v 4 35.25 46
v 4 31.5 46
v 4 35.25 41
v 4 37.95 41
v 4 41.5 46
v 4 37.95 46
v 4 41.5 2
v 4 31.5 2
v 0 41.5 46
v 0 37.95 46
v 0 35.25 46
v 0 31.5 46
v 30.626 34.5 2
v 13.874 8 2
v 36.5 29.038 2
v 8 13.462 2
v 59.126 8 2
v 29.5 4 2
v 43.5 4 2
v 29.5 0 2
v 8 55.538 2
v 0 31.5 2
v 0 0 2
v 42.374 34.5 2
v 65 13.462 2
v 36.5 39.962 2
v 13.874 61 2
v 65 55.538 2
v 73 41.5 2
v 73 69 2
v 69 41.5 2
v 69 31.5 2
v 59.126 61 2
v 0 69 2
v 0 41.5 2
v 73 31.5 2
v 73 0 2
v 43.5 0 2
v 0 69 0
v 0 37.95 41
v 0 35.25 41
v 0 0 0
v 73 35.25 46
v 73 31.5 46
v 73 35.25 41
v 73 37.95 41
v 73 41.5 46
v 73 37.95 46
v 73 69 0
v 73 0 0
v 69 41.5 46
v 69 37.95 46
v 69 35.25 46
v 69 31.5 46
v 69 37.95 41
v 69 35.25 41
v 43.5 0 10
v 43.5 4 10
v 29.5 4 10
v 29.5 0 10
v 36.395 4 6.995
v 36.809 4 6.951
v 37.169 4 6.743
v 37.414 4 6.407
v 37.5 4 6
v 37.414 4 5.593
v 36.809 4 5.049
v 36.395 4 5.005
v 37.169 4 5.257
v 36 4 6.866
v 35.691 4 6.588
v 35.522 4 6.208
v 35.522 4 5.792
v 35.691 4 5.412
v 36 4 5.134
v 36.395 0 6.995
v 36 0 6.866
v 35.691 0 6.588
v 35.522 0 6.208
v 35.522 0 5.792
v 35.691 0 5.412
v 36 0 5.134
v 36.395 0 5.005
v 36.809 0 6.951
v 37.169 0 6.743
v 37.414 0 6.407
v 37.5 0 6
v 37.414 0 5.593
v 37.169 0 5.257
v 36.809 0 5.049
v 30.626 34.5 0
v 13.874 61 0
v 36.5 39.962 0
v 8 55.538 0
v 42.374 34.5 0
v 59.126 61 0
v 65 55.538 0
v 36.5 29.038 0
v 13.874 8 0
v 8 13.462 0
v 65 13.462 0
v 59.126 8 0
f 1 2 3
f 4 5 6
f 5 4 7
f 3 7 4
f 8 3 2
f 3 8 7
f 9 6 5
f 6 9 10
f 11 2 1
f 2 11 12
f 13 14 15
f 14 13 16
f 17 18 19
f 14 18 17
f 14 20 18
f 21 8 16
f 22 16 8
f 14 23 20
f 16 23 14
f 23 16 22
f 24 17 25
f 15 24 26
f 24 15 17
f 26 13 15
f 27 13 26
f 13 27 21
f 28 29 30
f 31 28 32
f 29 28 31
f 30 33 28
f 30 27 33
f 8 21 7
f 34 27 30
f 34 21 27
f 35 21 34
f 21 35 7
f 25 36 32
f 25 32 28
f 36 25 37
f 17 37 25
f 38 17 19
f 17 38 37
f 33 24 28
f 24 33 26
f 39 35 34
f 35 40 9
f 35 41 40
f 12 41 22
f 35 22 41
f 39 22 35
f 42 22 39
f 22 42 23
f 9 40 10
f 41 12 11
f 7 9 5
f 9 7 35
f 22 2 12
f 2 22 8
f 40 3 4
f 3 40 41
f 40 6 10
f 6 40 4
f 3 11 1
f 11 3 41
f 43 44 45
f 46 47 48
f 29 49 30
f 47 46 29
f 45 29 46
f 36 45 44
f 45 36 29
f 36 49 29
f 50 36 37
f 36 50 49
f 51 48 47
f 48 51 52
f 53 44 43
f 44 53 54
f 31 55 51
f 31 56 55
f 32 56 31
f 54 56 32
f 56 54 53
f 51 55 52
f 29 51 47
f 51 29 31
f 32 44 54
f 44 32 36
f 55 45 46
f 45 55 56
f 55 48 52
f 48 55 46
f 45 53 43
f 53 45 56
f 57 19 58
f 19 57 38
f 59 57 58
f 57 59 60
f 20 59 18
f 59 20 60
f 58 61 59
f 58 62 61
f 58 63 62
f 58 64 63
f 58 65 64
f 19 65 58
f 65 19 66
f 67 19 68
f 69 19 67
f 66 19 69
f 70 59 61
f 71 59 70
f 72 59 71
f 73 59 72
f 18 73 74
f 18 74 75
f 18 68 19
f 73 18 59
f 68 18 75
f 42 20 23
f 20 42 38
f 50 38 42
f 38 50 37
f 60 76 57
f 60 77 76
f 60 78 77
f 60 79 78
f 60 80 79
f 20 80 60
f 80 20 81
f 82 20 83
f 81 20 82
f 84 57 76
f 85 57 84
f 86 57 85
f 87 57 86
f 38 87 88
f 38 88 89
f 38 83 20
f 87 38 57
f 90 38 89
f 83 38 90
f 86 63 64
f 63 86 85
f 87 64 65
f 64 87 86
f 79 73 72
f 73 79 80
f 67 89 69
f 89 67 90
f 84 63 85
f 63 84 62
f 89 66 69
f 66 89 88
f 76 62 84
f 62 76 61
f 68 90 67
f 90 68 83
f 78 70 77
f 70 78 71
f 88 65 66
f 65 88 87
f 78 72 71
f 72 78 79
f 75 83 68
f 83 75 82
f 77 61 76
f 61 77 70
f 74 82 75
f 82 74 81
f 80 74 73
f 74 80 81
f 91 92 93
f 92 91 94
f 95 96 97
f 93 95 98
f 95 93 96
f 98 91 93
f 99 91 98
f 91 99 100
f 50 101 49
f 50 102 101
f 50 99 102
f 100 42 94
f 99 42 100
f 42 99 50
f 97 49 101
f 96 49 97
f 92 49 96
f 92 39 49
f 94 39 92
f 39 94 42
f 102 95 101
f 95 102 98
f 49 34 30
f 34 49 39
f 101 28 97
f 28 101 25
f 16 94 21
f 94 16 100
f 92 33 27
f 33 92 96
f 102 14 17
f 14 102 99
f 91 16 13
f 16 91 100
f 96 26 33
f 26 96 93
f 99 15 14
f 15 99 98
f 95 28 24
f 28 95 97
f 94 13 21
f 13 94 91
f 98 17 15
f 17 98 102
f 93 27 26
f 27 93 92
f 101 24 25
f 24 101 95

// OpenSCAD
/*
 * Created by:
 * Thomas Buck <xythobuz@xythobuz.de> in April 2016
 *
 * Licensed under the Creative Commons - Attribution license.
 */

// -----------------------------------------------------------

spoolWidth = 65; // [20:70]
spoolDiameter = 65; // [20:70]
spoolHoleDiameter = 10; // [10:30]

part = "base"; // [base, holder]
cutout = "true"; // [true, false]

// -----------------------------------------------------------

/* [Hidden] */

armWidth = 10;
wallSize = 4;
baseHeight = 2;
bottomGapDivisor = 10; // spoolDiameter / bottomGapDivisor
holderHeightDivisor = 2; // spoolHoleDiameter / holderHeightDivisor
holderWidth = 2.5;
holderExtraLength = 2;
extraGap = 0.2;
feedWidth = 14;
feedHeight = 8;
feedDiameter = 2;

$fn = 15;

// -----------------------------------------------------------

module spool() {
    translate([0, spoolDiameter / 2, spoolDiameter / 2])
    rotate([0, 90, 0])
    difference() {
        cylinder(d = spoolDiameter, h = spoolWidth);
        
        translate([0, 0, -1])
            cylinder(d = spoolHoleDiameter, h = spoolWidth + 2);
    }
}

module arm() {
    difference() {
        cube([wallSize, armWidth, (spoolDiameter / bottomGapDivisor) + ((spoolDiameter + spoolHoleDiameter) / 2)]);
        translate([-1, (armWidth - holderWidth) / 2, (spoolDiameter / bottomGapDivisor) + ((spoolDiameter + spoolHoleDiameter) / 2) - (spoolHoleDiameter / holderHeightDivisor)])
            cube([wallSize + 2, holderWidth + extraGap, (spoolHoleDiameter / holderHeightDivisor) + 1]);
    }
}

module feed() {
    difference() {
        cube([feedWidth, wallSize, feedHeight]);
        translate([feedWidth / 2, wallSize + 1, feedHeight / 2])
            rotate([90, 0, 0])
            cylinder(d = feedDiameter, h = wallSize + 2);
    }
}

module base() {
    difference() {
        union() {
            cube([spoolWidth + (2 * wallSize), spoolDiameter + wallSize, baseHeight]);
            translate([0, wallSize + ((spoolDiameter - armWidth) / 2), baseHeight])
                arm();
            translate([spoolWidth + wallSize, wallSize + ((spoolDiameter - armWidth) / 2), baseHeight])
                arm();
            translate([wallSize + (spoolWidth - feedWidth) / 2, 0, baseHeight])
                feed();
        }
        
        if (cutout == "true") {
            translate([wallSize * 2, wallSize * 2, -1])
                cube([spoolWidth - (wallSize * 2), spoolDiameter - (wallSize * 3), baseHeight + 2]);
        }
    }
    
    if (cutout == "true") {
        translate([wallSize * 2, wallSize * 2, 0])
            rotate([0, 0, atan((spoolDiameter - (wallSize * 3)) / (spoolWidth - (wallSize * 2)))])
            translate([0, -wallSize, 0])
            cube([sqrt(((spoolWidth - (wallSize * 2)) * (spoolWidth - (wallSize * 2))) + ((spoolDiameter - (wallSize * 3)) * (spoolDiameter - (wallSize * 3)))), wallSize * 2, baseHeight]);
        
        translate([wallSize * 2 + (spoolWidth - (wallSize * 2)), wallSize * 2, 0])
            rotate([0, 0, 180 - atan((spoolDiameter - (wallSize * 3)) / (spoolWidth - (wallSize * 2)))])
            translate([0, -wallSize, 0])
            cube([sqrt(((spoolWidth - (wallSize * 2)) * (spoolWidth - (wallSize * 2))) + ((spoolDiameter - (wallSize * 3)) * (spoolDiameter - (wallSize * 3)))), wallSize * 2, baseHeight]);
    }
}

module holder() {
    translate([0, wallSize + ((spoolDiameter - armWidth) / 2) + (armWidth - holderWidth) / 2 + (extraGap / 2), baseHeight + (spoolDiameter / bottomGapDivisor) + ((spoolDiameter + spoolHoleDiameter) / 2) - (spoolHoleDiameter / holderHeightDivisor)])
    union() {
        translate([wallSize + (holderExtraLength / 2), holderWidth / 2, (spoolHoleDiameter / holderHeightDivisor) / 2])
        rotate([0, 90, 0])
            cylinder(d = spoolHoleDiameter / holderHeightDivisor, h = spoolWidth - holderExtraLength);
    
        cube([wallSize + (holderExtraLength / 2), holderWidth, spoolHoleDiameter / holderHeightDivisor]);
    
        translate([wallSize + (holderExtraLength / 2) + spoolWidth - holderExtraLength, 0, 0])
            cube([wallSize + (holderExtraLength / 2), holderWidth, spoolHoleDiameter / holderHeightDivisor]);
    }
}

// -----------------------------------------------------------

%translate([wallSize, wallSize, baseHeight + (spoolDiameter / bottomGapDivisor)])
    spool();

if (part == "base") {
    base();
} else {
    %base();
}

if (part == "holder") {
    holder();
} else {
    %holder();
}
